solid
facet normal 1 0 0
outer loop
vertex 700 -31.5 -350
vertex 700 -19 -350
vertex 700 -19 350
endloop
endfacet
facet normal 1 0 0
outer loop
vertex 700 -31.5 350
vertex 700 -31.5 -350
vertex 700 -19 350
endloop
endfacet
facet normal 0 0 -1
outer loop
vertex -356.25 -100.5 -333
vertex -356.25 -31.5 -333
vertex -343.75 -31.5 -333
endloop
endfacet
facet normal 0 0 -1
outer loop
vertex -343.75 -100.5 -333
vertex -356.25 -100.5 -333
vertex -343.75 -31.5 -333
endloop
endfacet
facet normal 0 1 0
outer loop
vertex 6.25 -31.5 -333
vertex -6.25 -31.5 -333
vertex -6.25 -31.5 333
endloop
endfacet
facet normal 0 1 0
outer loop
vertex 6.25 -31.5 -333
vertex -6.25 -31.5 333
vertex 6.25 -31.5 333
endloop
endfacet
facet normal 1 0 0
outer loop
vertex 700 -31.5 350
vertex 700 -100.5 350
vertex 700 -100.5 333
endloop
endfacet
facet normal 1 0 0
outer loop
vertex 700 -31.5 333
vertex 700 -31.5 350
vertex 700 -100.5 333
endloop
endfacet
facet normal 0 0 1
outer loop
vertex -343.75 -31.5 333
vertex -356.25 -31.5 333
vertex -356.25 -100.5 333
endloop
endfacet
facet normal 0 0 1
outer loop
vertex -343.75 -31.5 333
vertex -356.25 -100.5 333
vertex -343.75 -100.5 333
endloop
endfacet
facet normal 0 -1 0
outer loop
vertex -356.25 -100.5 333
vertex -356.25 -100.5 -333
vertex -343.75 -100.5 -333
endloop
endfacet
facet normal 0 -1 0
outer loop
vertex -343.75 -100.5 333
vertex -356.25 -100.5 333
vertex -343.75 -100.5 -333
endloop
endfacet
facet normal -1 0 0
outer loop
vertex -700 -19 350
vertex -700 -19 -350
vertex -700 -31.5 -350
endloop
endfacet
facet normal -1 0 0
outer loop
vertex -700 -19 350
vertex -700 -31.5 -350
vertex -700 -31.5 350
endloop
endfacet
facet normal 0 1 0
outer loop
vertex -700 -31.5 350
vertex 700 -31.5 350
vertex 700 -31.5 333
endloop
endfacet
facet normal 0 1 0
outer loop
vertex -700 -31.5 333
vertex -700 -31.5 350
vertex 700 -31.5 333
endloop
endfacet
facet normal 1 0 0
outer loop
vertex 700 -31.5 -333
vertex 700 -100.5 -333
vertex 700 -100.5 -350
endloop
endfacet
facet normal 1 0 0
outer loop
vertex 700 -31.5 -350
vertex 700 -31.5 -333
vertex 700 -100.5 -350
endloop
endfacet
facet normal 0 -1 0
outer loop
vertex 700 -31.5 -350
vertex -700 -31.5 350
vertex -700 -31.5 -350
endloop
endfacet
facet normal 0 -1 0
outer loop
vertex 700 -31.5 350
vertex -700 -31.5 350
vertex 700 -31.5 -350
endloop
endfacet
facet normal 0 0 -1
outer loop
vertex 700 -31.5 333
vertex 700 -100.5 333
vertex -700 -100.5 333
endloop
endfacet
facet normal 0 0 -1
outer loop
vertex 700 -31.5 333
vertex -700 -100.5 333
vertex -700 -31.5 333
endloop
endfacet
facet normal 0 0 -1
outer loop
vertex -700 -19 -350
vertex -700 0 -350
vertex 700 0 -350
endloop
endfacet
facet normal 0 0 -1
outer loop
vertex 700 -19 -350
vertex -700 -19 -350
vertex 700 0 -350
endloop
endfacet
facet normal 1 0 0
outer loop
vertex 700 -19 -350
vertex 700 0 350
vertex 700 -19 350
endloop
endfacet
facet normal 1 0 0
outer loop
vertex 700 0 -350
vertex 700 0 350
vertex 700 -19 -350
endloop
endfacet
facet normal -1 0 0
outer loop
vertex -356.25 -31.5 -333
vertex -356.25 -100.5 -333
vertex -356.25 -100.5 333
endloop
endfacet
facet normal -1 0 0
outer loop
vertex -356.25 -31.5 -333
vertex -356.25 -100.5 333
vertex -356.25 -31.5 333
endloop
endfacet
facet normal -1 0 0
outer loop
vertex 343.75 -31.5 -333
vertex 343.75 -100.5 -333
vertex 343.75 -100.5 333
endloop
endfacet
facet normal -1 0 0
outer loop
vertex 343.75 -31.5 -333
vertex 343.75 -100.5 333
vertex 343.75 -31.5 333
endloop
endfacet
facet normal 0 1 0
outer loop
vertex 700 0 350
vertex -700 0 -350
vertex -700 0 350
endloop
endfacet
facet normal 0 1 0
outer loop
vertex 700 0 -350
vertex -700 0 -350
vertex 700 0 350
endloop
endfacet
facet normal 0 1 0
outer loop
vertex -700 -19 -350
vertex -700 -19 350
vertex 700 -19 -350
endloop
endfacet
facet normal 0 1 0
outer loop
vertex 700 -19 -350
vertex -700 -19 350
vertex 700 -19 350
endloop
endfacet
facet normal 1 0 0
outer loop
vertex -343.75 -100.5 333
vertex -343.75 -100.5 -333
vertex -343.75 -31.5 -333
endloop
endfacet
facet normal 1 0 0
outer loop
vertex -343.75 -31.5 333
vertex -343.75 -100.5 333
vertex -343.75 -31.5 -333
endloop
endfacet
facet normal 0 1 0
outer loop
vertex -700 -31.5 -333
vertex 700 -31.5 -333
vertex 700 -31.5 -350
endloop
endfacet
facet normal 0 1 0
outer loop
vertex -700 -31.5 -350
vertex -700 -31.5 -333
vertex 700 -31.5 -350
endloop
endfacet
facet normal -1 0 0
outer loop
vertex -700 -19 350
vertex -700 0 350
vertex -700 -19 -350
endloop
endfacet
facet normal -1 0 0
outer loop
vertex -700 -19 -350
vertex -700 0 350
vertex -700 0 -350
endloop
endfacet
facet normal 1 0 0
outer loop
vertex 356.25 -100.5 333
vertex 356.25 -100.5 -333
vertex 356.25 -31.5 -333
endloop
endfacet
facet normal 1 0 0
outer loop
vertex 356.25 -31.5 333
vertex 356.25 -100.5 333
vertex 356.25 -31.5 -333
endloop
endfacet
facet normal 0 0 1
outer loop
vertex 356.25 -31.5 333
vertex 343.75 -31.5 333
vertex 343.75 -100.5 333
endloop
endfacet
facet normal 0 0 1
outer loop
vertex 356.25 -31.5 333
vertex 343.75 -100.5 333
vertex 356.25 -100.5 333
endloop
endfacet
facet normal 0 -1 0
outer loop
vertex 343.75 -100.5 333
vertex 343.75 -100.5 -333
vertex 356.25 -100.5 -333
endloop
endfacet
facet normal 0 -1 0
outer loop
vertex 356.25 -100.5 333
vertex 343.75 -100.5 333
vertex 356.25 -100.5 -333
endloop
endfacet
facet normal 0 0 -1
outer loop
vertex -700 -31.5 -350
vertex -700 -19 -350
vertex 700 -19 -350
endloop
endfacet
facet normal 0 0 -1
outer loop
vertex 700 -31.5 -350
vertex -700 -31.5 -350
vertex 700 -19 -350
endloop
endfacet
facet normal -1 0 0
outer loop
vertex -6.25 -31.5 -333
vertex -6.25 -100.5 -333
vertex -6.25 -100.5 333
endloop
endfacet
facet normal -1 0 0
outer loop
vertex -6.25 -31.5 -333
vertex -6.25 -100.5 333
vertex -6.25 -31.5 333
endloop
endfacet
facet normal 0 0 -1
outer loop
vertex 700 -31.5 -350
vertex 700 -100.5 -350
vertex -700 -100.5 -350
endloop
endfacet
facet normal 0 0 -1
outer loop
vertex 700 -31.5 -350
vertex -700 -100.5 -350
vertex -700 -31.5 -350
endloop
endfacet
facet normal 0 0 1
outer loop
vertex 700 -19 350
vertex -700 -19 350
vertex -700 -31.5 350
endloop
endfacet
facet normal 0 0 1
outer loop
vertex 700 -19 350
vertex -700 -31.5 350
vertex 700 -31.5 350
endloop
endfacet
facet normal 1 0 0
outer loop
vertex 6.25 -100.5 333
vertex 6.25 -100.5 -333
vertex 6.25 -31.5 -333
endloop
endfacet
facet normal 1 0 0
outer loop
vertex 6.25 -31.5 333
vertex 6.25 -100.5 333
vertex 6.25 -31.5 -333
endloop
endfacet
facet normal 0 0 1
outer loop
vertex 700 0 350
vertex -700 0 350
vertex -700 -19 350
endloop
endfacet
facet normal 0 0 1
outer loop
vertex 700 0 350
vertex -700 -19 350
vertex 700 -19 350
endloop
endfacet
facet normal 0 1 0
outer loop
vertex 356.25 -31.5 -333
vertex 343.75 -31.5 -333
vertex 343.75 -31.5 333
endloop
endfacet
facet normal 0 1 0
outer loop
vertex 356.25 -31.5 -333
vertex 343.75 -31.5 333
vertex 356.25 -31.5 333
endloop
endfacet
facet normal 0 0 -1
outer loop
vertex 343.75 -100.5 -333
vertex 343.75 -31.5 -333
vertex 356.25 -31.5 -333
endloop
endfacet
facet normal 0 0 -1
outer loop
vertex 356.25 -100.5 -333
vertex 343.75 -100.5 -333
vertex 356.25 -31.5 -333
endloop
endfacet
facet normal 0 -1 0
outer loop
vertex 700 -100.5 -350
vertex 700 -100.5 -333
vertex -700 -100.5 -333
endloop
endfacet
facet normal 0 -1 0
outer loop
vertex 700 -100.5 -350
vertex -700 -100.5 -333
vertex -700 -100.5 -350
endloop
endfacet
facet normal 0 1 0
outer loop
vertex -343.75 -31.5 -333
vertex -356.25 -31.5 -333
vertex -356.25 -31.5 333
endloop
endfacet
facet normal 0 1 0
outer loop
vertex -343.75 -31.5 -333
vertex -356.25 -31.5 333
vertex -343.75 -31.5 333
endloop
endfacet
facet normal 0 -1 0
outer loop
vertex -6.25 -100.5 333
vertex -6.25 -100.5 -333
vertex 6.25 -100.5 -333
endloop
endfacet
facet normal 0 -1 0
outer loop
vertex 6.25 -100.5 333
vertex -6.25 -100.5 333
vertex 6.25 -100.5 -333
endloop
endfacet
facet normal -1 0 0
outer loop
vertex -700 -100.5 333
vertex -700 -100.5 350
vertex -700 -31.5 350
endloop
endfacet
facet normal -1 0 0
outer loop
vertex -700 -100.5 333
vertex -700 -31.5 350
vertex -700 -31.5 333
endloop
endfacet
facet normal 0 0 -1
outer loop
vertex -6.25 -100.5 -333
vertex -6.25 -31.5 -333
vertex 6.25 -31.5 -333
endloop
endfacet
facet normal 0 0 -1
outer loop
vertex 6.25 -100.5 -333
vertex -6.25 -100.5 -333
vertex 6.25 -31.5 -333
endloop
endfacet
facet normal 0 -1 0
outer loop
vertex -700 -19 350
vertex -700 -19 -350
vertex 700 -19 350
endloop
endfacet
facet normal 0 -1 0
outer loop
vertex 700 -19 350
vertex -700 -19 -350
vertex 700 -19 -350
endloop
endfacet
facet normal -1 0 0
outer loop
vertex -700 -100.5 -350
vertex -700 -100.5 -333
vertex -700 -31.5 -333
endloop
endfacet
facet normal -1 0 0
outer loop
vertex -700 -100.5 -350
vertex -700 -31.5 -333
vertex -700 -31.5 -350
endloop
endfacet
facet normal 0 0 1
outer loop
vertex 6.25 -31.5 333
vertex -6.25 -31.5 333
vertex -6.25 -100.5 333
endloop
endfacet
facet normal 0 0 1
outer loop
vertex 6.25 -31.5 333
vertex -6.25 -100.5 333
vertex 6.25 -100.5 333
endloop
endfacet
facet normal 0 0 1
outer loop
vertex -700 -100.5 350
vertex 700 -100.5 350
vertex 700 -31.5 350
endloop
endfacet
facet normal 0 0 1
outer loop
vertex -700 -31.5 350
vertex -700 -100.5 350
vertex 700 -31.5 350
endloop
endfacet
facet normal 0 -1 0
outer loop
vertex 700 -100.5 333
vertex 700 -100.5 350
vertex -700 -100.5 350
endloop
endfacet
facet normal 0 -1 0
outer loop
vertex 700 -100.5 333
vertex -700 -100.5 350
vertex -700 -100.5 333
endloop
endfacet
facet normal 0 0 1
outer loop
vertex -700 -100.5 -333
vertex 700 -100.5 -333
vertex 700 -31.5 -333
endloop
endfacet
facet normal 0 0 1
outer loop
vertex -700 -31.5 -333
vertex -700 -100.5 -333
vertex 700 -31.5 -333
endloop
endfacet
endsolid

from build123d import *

# Parameters (mm, degrees)
SKETCH1_W             = 1400
SKETCH1_H             = 700
BOSS_EXTRUDE1_DEPTH   = 19
SKETCH2_W             = 1400
SKETCH2_H             = 700
BOSS_EXTRUDE2_DEPTH   = 12.5
SKETCH3_W             = 17
SKETCH3_H             = 69
BOSS_EXTRUDE3_DEPTH   = 1400
BOSS_EXTRUDE3_2_DEPTH = 1400
SKETCH4_W             = 12.5
SKETCH4_H             = 69
BOSS_EXTRUDE4_DEPTH   = 666
BOSS_EXTRUDE4_2_DEPTH = 666
BOSS_EXTRUDE4_3_DEPTH = 666


with BuildPart() as part:
    # Sketch1 → Boss-Extrude1 (new body)
    with BuildSketch(Plane(origin=(0, 0, 0), x_dir=(1, 0, 0), z_dir=(0, 1, 0))):
        Rectangle(SKETCH1_W, SKETCH1_H)
    extrude(amount=-BOSS_EXTRUDE1_DEPTH)


with BuildPart() as body_2:
    # Sketch2 → Boss-Extrude2 (new body)
    with BuildSketch(Plane.XZ.offset(19)):
        Rectangle(SKETCH2_W, SKETCH2_H)
    extrude(amount=BOSS_EXTRUDE2_DEPTH)


with BuildPart() as body_3:
    # Sketch3 → Boss-Extrude3 (new body)
    with BuildSketch(Plane(origin=(700, 0, 0), x_dir=(0, 0, -1), z_dir=(1, 0, 0))):
        with Locations((-341.5, -66)):
            Rectangle(SKETCH3_W, SKETCH3_H)
    extrude(amount=-BOSS_EXTRUDE3_DEPTH)


with BuildPart() as body_4:
    # Sketch3 → Boss-Extrude3 2 (new body)
    with BuildSketch(Plane(origin=(700, 0, 0), x_dir=(0, 0, -1), z_dir=(1, 0, 0))):
        with Locations((341.5, -66)):
            Rectangle(SKETCH3_W, SKETCH3_H)
    extrude(amount=-BOSS_EXTRUDE3_2_DEPTH)


with BuildPart() as body_5:
    # Sketch4 → Boss-Extrude4 (new body)
    with BuildSketch(Plane.XY.offset(-333)):
        with Locations((0, -66)):
            Rectangle(SKETCH4_W, SKETCH4_H)
    extrude(amount=BOSS_EXTRUDE4_DEPTH)


with BuildPart() as body_6:
    # Sketch4 → Boss-Extrude4 2 (new body)
    with BuildSketch(Plane.XY.offset(-333)):
        with Locations((350, -66)):
            Rectangle(SKETCH4_W, SKETCH4_H)
    extrude(amount=BOSS_EXTRUDE4_2_DEPTH)


with BuildPart() as body_7:
    # Sketch4 → Boss-Extrude4 3 (new body)
    with BuildSketch(Plane.XY.offset(-333)):
        with Locations((-350, -66)):
            Rectangle(SKETCH4_W, SKETCH4_H)
    extrude(amount=BOSS_EXTRUDE4_3_DEPTH)


solid = Compound([part.part, body_2.part, body_3.part, body_4.part, body_5.part, body_6.part, body_7.part])
